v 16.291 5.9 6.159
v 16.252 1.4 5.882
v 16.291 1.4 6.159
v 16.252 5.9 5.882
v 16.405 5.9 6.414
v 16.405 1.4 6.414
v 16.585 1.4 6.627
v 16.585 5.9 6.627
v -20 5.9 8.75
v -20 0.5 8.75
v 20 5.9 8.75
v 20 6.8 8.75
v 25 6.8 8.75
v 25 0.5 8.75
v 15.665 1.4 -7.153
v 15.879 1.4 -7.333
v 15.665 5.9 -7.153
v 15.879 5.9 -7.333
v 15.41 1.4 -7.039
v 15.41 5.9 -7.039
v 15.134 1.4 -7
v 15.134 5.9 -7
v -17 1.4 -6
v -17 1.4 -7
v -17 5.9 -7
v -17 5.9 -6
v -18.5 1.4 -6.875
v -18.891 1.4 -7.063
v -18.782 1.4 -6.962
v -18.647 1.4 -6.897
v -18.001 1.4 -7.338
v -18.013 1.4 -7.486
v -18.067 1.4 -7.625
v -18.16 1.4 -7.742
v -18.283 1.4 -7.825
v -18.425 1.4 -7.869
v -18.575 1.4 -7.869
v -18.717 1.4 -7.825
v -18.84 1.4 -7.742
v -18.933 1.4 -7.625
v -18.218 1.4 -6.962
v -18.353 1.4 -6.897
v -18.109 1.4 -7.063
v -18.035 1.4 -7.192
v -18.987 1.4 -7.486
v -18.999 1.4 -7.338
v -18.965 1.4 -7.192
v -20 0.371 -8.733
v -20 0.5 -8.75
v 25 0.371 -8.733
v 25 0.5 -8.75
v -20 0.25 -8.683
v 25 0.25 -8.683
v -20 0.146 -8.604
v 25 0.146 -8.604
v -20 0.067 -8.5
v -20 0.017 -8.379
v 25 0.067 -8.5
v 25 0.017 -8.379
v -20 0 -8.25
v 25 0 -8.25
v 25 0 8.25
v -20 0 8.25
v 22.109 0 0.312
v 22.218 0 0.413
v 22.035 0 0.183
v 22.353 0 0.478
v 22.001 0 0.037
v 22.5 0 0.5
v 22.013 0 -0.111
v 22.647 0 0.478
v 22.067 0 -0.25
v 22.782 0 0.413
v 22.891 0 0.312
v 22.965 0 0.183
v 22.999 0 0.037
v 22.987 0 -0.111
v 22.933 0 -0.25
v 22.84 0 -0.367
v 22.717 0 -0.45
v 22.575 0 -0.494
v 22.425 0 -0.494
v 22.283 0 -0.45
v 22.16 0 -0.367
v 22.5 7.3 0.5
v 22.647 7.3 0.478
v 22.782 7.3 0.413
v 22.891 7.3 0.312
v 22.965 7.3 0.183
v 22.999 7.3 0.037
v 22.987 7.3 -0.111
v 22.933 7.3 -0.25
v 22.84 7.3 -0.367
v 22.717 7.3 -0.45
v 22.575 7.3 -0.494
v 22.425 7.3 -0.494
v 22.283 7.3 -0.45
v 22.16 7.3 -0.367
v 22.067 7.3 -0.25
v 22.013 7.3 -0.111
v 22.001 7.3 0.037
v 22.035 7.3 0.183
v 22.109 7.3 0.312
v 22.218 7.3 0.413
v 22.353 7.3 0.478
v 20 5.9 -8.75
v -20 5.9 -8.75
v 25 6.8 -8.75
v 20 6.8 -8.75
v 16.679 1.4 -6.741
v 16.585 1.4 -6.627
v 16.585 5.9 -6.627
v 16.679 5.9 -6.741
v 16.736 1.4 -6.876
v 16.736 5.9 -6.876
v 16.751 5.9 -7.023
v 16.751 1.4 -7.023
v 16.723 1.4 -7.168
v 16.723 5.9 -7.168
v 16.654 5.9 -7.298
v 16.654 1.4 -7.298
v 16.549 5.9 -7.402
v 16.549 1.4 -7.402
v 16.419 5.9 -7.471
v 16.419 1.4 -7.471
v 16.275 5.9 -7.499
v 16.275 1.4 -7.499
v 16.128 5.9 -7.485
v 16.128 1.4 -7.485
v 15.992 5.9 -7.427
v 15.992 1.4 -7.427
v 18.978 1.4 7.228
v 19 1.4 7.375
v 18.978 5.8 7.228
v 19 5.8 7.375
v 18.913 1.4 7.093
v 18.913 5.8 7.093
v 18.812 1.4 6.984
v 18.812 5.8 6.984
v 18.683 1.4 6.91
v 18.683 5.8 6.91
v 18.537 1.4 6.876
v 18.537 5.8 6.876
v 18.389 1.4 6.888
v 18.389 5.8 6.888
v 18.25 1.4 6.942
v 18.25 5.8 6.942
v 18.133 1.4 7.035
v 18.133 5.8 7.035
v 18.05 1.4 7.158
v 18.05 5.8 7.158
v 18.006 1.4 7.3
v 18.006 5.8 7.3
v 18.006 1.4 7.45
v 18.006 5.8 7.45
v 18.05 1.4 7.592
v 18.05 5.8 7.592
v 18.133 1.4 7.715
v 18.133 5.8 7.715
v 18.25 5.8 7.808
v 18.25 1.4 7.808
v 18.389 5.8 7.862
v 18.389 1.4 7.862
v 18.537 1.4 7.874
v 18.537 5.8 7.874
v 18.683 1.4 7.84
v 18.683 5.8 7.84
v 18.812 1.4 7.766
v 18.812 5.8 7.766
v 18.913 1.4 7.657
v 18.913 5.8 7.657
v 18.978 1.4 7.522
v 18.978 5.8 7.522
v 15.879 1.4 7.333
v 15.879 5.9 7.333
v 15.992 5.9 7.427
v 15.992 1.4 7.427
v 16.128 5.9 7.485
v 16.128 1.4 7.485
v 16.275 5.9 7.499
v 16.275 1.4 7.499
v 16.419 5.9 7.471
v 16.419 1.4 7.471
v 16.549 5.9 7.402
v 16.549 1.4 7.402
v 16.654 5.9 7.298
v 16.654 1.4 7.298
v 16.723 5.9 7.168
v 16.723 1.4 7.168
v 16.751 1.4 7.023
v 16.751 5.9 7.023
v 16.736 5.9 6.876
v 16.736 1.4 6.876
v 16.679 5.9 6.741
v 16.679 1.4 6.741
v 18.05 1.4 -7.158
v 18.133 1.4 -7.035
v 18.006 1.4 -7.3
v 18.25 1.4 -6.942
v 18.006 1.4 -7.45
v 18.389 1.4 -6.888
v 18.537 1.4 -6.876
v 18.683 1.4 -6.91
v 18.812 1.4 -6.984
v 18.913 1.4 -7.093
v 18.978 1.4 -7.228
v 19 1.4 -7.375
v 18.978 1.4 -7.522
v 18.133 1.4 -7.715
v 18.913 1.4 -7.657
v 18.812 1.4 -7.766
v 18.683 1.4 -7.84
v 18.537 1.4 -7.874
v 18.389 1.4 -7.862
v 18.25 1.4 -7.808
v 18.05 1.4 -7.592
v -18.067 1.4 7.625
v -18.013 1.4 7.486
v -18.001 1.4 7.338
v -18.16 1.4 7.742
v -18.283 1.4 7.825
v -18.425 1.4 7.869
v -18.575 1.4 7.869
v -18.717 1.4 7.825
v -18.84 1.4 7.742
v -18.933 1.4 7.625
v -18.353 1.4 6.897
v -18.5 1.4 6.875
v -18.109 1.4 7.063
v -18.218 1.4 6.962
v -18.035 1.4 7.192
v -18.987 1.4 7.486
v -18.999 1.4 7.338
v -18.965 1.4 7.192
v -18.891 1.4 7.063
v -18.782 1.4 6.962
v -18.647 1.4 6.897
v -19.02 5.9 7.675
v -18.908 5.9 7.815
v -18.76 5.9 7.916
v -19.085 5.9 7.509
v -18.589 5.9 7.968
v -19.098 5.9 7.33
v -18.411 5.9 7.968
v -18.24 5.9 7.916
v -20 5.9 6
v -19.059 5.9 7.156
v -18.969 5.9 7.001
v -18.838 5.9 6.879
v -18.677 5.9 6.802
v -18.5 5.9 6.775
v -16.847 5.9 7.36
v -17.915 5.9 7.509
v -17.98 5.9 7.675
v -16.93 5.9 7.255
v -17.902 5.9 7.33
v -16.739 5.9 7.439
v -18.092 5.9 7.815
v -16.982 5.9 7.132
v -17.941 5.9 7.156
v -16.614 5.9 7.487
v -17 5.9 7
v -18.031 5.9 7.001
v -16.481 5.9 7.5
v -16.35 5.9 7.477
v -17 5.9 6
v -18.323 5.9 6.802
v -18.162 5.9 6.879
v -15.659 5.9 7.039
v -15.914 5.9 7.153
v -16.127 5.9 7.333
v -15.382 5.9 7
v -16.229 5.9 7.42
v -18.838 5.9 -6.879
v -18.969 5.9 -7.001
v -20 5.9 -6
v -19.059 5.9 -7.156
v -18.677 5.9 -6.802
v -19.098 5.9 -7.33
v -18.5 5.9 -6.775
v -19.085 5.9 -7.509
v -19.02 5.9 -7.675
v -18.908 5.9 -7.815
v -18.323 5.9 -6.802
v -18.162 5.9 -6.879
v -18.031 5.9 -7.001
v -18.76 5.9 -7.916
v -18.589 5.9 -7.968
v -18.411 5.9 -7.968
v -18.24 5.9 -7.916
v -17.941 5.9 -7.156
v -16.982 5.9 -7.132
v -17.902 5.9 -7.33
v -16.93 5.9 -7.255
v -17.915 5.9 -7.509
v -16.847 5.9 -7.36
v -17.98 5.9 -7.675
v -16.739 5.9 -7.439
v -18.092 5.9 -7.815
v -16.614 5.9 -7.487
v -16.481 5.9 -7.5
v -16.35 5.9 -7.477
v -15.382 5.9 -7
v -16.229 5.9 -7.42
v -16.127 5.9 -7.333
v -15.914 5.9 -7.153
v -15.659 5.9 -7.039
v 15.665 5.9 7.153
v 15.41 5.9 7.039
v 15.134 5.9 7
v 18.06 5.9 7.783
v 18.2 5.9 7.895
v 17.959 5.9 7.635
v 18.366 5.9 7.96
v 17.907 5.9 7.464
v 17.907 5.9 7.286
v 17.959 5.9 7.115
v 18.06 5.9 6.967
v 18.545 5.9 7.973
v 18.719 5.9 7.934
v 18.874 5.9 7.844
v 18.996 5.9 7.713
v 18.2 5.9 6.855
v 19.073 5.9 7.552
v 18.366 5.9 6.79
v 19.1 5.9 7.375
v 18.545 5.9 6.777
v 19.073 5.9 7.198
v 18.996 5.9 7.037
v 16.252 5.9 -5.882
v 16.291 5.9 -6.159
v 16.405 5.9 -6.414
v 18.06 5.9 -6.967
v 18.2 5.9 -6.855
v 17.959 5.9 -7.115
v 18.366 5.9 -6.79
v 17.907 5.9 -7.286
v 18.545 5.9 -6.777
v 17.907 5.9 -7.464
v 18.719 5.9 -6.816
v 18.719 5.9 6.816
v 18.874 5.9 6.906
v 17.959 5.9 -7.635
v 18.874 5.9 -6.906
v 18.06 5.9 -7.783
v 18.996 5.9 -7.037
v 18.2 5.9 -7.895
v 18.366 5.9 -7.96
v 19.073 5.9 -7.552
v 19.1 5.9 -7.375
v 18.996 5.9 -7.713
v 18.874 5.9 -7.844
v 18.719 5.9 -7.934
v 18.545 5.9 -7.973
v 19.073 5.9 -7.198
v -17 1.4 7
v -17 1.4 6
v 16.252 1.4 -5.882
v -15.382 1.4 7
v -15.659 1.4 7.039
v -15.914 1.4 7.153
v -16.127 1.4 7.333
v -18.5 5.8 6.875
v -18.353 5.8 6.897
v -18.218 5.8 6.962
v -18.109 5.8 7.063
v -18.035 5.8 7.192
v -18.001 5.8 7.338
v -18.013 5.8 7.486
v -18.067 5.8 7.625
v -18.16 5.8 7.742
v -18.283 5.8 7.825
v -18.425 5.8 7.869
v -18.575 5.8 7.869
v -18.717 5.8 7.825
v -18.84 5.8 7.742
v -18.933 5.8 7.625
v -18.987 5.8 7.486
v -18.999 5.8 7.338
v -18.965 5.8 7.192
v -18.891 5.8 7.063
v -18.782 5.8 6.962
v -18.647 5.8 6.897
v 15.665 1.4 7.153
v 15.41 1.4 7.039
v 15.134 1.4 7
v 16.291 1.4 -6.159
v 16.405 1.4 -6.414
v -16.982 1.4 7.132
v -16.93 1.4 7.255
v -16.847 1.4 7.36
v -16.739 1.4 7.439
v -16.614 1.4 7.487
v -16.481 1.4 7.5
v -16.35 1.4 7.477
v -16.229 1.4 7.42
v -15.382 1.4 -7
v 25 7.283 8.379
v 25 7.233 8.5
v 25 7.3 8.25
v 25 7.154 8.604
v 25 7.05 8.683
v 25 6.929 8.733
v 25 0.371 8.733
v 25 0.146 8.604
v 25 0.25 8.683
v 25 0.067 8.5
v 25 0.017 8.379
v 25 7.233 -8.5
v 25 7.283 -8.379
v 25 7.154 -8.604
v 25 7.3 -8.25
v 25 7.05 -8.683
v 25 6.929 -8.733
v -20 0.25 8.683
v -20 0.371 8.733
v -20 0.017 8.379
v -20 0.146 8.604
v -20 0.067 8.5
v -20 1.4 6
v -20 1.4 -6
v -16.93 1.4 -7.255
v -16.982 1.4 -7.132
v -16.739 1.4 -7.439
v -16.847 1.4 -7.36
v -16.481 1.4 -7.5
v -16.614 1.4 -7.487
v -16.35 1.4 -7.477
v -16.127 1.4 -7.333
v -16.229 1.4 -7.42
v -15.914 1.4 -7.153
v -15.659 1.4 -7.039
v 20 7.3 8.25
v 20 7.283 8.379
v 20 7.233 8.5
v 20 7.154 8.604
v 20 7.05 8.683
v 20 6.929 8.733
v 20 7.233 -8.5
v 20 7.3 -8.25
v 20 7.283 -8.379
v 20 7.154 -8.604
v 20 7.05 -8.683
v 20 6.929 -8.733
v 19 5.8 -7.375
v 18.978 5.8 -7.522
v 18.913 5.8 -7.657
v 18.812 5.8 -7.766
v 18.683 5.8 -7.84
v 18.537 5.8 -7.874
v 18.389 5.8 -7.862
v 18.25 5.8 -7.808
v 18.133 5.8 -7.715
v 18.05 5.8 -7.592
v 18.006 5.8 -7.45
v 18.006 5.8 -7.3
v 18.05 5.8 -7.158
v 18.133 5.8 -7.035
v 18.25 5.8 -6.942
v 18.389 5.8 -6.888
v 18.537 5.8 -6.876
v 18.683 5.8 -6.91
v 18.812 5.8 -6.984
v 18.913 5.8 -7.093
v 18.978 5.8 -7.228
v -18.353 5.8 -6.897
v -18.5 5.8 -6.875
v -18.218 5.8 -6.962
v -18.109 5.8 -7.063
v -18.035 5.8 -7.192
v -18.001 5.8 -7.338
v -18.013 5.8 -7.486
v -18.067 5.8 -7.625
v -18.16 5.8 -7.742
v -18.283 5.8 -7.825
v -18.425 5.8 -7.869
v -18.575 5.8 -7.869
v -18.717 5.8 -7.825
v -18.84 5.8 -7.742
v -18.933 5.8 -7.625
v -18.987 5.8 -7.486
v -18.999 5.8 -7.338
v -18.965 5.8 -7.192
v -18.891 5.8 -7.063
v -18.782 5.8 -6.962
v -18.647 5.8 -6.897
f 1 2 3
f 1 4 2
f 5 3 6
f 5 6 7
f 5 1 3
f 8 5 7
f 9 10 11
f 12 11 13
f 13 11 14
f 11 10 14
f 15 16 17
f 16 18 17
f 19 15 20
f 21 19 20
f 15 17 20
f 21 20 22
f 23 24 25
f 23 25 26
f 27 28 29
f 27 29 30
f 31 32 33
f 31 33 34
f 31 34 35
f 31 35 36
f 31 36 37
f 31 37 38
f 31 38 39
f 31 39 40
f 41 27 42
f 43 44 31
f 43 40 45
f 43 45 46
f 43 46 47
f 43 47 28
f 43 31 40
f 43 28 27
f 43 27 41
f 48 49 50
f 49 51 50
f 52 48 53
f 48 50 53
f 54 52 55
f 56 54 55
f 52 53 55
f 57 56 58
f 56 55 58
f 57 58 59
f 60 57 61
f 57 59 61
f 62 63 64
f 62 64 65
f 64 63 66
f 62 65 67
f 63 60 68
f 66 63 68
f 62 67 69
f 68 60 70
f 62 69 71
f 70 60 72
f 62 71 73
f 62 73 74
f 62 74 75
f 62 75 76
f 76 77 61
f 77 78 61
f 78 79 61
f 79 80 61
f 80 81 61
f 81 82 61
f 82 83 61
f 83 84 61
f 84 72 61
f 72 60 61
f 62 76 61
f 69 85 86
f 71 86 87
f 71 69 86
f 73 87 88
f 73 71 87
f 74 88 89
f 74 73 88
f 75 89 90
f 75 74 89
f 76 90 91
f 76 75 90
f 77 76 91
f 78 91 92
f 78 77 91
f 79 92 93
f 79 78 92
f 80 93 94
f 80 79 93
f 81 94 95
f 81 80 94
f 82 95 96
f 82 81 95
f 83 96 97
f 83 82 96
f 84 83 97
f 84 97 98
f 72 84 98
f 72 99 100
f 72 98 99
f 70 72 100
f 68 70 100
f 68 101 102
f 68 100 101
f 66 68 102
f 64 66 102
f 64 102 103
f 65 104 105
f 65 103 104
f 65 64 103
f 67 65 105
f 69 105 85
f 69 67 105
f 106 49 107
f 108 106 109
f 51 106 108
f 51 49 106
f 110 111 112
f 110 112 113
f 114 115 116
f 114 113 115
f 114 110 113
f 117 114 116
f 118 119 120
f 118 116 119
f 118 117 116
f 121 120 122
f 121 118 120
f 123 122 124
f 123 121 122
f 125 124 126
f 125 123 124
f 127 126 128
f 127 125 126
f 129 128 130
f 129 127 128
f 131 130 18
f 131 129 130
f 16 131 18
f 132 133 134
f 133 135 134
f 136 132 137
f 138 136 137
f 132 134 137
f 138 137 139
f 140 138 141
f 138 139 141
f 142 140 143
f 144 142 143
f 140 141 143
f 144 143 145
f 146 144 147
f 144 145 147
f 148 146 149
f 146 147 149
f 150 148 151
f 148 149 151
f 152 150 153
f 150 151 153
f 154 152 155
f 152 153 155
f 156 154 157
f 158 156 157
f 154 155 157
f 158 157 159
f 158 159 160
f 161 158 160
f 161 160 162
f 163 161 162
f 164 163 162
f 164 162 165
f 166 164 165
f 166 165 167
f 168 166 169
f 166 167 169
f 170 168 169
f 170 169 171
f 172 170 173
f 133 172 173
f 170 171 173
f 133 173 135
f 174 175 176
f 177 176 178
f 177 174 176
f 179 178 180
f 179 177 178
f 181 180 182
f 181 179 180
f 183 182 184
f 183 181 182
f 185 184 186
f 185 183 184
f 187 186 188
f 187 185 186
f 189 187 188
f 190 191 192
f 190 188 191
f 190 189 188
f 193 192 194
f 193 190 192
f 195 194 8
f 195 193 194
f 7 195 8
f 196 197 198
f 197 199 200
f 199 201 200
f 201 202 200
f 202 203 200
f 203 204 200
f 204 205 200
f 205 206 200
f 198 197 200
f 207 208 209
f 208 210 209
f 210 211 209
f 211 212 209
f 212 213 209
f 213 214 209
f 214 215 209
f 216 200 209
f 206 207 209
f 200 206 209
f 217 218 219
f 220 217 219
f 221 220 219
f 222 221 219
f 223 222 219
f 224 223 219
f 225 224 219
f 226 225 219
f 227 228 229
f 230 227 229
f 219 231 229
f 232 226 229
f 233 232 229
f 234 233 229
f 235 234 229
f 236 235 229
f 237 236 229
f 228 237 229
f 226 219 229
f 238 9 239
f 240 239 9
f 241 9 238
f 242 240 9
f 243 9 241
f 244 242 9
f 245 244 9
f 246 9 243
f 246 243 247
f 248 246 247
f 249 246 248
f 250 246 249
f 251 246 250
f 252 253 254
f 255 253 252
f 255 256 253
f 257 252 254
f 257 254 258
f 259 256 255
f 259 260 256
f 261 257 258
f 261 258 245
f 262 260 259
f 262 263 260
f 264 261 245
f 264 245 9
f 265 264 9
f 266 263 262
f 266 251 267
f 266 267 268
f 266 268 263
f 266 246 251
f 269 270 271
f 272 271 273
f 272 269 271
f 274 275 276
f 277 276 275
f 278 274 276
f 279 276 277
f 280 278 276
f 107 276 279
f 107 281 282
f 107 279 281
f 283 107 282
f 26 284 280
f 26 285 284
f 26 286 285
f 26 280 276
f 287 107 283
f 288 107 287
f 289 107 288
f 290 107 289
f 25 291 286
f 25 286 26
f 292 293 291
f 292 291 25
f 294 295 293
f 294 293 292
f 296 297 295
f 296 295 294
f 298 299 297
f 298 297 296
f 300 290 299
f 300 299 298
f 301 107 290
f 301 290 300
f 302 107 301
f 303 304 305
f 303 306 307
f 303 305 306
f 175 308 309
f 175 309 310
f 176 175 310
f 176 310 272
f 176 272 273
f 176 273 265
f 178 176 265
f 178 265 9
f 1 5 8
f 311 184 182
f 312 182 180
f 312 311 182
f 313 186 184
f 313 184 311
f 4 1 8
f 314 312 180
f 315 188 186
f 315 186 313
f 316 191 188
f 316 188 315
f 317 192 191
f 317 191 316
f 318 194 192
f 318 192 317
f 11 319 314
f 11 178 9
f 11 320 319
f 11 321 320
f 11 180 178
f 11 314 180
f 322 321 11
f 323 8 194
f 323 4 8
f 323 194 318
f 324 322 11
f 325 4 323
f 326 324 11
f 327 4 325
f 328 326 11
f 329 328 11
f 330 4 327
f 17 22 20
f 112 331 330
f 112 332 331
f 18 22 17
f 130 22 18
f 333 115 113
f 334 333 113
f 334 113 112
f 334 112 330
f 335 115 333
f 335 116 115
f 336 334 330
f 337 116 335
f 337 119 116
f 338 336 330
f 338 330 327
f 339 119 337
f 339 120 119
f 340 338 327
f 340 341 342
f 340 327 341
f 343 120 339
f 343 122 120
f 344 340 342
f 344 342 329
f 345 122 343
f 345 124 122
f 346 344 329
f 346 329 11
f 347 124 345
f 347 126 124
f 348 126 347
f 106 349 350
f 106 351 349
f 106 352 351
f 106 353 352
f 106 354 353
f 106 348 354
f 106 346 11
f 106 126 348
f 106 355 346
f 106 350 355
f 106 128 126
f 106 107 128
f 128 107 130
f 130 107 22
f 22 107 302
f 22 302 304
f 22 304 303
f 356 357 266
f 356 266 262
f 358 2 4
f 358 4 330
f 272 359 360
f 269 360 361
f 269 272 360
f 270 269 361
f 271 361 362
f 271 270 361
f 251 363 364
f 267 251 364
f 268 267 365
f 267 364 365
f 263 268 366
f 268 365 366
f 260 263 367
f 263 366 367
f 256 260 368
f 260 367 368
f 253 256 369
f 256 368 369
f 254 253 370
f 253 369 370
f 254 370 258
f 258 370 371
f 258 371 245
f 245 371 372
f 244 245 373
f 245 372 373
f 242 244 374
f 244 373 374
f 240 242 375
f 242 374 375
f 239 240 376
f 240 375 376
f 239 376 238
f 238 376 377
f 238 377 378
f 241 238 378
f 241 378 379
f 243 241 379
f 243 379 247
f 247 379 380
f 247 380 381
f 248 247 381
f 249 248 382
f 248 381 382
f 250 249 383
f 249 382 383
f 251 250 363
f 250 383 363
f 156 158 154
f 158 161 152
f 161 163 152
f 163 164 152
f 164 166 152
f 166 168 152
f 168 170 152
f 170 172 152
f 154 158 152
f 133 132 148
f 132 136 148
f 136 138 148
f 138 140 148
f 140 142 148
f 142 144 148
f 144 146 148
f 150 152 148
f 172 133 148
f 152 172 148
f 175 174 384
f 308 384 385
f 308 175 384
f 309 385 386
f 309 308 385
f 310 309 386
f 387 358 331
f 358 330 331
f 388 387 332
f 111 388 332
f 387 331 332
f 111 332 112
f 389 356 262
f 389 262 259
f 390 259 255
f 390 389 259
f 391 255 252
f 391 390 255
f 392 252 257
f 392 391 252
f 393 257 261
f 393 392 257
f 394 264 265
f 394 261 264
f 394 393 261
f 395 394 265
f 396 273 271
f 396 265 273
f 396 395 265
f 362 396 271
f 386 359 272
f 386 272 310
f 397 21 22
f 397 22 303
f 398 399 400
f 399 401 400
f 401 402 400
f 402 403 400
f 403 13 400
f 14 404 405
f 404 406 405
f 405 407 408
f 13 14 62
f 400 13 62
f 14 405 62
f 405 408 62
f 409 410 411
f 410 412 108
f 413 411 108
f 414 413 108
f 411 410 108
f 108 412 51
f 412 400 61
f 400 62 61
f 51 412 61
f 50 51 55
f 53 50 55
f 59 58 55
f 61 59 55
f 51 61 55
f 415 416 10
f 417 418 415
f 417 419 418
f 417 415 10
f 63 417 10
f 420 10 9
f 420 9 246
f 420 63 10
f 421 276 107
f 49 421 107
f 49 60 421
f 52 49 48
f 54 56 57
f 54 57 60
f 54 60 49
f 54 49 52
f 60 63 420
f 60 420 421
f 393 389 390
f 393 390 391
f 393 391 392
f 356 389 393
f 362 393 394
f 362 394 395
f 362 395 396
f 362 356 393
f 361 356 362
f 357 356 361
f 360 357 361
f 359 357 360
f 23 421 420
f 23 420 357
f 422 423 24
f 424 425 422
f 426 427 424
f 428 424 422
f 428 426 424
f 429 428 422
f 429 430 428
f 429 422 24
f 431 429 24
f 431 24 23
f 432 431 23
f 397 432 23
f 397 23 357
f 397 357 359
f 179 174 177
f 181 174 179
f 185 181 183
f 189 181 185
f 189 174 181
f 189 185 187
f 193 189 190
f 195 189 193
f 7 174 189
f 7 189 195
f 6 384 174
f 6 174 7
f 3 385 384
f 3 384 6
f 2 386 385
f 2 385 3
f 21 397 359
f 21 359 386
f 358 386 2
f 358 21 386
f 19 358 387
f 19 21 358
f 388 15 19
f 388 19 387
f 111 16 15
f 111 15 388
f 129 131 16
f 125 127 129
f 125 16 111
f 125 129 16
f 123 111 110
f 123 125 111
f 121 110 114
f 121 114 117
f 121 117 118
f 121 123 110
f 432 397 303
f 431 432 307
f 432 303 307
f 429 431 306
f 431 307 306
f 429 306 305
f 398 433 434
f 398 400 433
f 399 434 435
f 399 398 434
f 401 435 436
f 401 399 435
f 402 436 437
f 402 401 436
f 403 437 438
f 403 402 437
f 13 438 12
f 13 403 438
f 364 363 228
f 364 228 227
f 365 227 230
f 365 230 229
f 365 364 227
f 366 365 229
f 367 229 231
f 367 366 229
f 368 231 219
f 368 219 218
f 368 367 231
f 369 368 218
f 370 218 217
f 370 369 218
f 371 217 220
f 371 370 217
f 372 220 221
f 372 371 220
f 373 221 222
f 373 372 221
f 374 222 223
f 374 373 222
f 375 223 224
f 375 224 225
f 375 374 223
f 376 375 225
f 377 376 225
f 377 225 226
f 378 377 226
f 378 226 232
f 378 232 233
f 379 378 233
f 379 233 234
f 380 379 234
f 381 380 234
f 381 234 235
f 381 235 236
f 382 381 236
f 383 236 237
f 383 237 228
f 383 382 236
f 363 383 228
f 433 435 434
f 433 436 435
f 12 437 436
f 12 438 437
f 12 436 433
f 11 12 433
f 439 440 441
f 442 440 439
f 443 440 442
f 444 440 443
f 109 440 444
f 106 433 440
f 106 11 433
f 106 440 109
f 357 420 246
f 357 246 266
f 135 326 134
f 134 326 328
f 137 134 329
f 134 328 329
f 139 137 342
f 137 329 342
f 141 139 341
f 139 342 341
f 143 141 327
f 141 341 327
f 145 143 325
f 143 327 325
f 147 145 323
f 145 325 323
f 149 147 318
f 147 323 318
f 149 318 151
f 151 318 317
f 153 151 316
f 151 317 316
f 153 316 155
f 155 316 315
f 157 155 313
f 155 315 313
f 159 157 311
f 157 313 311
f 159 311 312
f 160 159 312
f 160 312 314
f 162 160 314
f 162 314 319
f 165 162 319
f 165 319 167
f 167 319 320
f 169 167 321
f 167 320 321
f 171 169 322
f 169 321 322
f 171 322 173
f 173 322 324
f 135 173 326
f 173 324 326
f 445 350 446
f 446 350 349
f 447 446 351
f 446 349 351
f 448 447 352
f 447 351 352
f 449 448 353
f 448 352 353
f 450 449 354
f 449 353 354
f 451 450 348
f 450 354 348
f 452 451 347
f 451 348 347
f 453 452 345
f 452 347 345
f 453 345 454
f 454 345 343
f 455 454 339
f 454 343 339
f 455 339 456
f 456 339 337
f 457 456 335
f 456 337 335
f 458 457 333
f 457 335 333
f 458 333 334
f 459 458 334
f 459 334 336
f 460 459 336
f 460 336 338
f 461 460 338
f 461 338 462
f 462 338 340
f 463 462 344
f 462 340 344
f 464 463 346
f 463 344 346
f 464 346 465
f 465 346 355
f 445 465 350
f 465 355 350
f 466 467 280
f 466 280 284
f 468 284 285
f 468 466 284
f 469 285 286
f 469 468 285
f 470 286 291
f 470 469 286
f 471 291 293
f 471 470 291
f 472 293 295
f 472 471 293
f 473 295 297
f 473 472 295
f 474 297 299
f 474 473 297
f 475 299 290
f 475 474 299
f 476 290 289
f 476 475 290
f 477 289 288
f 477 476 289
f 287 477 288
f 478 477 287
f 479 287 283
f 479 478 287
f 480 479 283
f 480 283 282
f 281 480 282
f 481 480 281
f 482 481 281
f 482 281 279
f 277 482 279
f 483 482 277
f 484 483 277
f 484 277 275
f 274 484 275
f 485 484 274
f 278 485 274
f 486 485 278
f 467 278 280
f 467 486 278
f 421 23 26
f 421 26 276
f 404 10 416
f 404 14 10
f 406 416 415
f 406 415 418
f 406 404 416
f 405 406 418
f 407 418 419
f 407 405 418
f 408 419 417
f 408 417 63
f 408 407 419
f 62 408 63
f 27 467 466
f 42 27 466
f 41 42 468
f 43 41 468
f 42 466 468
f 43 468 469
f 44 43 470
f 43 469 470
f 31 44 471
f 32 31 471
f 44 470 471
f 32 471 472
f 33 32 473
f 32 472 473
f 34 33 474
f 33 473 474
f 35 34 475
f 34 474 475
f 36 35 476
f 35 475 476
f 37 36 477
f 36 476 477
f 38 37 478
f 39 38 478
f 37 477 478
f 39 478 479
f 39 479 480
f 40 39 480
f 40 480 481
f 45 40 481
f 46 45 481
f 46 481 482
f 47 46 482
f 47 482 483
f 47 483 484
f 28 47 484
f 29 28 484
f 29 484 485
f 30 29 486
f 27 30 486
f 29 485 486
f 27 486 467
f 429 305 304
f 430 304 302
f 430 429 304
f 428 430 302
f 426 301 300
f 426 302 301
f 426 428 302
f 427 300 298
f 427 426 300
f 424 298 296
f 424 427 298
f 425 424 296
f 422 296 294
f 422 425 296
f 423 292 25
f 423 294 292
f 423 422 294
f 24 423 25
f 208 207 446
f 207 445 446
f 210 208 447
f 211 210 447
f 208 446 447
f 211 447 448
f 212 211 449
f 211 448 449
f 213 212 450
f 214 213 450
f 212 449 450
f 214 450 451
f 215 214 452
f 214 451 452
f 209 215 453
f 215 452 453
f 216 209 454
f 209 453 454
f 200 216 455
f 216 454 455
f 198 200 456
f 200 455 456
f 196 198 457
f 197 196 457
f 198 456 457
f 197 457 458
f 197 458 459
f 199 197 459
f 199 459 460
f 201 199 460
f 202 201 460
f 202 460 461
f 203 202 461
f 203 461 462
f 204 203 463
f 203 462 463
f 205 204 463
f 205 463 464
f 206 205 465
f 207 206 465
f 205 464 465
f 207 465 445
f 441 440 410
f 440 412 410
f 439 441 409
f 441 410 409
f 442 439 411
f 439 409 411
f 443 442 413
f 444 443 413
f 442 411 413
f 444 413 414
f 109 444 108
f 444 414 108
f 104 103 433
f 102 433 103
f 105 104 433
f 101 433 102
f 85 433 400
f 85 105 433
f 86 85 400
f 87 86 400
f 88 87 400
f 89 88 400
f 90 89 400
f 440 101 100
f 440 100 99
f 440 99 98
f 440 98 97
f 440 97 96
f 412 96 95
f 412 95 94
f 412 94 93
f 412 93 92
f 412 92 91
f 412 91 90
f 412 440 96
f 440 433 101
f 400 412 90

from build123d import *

# Parameters (mm, degrees)
SKETCH_1_W                 = 45
SKETCH_1_H                 = 17.5
EXTRUDE_2_DEPTH            = 5.9
CUT_EXTRUDE_1_DEPTH        = 10
CUT_EXTRUDE_1_DEPTH_BACK   = 2.4
FILLET_1_R                 = 1
FILLET_2_R                 = 1
FILLET_5_R                 = 1
FILLET_6_R                 = 1
FILLET_7_R                 = 0.5
SKETCH_5_R                 = 0.5
CUT_EXTRUDE_2_DEPTH        = 4.5
CHAMFER_1_SIZE             = 0.1
CHAMFER_1_OF_MIRROR_1_SIZE = 0.1
SKETCH_20_W                = 5
SKETCH_20_H                = 17.5
EXTRUDE_3_DEPTH            = 1.4
FILLET_8_R                 = 0.5
SKETCH_21_R                = 0.5
CUT_EXTRUDE_3_DEPTH        = 11


# Read off the part's stored shape, not the designer's step: 镜向2
with BuildPart() as part:
    # 草图1 → 凸台-拉伸2 (new body)
    with BuildSketch(Plane(origin=(0, 0, 0), x_dir=(1, 0, 0), z_dir=(0, 1, 0))):
        with Locations((2.5, 0)):
            Rectangle(SKETCH_1_W, SKETCH_1_H)
    extrude(amount=EXTRUDE_2_DEPTH)

    # 草图3 → 切除-拉伸1 (cut, two sides: drawn at the far end of the back side and taken through both)
    with BuildSketch(Plane(origin=(0, 3.8, 0), x_dir=(1, 0, 0), z_dir=(0, 1, 0)).offset(-CUT_EXTRUDE_1_DEPTH_BACK)):
        with BuildLine():
            Line((-17, -6.5), (-17, -7))
            ThreePointArc((-17, -7), (-16.5, -7.5), (-16, -7))
            Line((-16, -7), (15.751729614, -7))
            ThreePointArc((15.751729614, -7), (16.605283005, -7.353553391), (16.251729614, -6.5))
            Line((16.251729614, -6.5), (16.251729614, 6.5))
            ThreePointArc((16.251729614, 6.5), (16.605283005, 7.353553391), (15.751729614, 7))
            Line((15.751729614, 7), (-16, 7))
            ThreePointArc((-16, 7), (-16.5, 7.5), (-17, 7))
            Line((-17, 7), (-17, 6.5))
            Line((-17, 6.5), (-17, 6))
            Line((-17, 6), (-20, 6))
            Line((-20, 6), (-20, -6))
            Line((-20, -6), (-17, -6))
            Line((-17, -6), (-17, -6.5))
        make_face()
    extrude(amount=CUT_EXTRUDE_1_DEPTH + CUT_EXTRUDE_1_DEPTH_BACK, mode=Mode.SUBTRACT)

    # 圆角1
    fillet_1_edges = [part.edges().sort_by_distance(p)[0] for p in [
        (16.251729614, 3.65, -6.5),
    ]]
    fillet(fillet_1_edges, radius=FILLET_1_R)

    # 圆角2
    fillet_2_edges = [part.edges().sort_by_distance(p)[0] for p in [
        (15.751729614, 3.65, -7),
    ]]
    fillet(fillet_2_edges, radius=FILLET_2_R)

    # 圆角5
    fillet_5_edges = [part.edges().sort_by_distance(p)[0] for p in [
        (-16, 3.65, 7),
        (-16, 3.65, -7),
    ]]
    fillet(fillet_5_edges, radius=FILLET_5_R)

    # 圆角6
    fillet_6_edges = [part.edges().sort_by_distance(p)[0] for p in [
        (15.751729614, 3.65, 7),
        (16.251729614, 3.65, 6.5),
    ]]
    fillet(fillet_6_edges, radius=FILLET_6_R)

    # 圆角7
    fillet_7_edges = [part.edges().sort_by_distance(p)[0] for p in [
        (2.5, 0, -8.75),
        (2.5, 0, 8.75),
    ]]
    fillet(fillet_7_edges, radius=FILLET_7_R)

    # 草图5 → 切除-拉伸2 (cut)
    with BuildSketch(Plane(origin=(0, 5.9, 0), x_dir=(1, 0, 0), z_dir=(0, 1, 0))):
        with Locations(Location((-18.5, 7.375, 0), (0, 0, 270))):
            Circle(SKETCH_5_R)
    cut_extrude_2 = extrude(amount=-CUT_EXTRUDE_2_DEPTH, mode=Mode.SUBTRACT)

    # 倒角1
    chamfer_1_edges = [part.edges().sort_by_distance(p)[0] for p in [
        (-18.5, 5.9, -7.875),
    ]]
    chamfer(chamfer_1_edges, length=CHAMFER_1_SIZE)

    # 镜向1: 切除-拉伸2 across plane
    add(cut_extrude_2.mirror(Plane.XY), mode=Mode.SUBTRACT)

    # 倒角1 of 镜向1
    chamfer_1_of_mirror_1_edges = [part.edges().sort_by_distance(p)[0] for p in [
        (-18.5, 5.9, 7.875),
    ]]
    chamfer(chamfer_1_of_mirror_1_edges, length=CHAMFER_1_OF_MIRROR_1_SIZE)

    # 镜向2 outline → 镜向2 (revolve, cut)
    with BuildSketch(Plane(origin=(18.5, 0, -7.375), x_dir=(1, 0, 0), z_dir=(0, 0, 1))):
        Polygon((0, 5.9), (0, 1.4), (0.5, 1.4), (0.5, 5.8), (0.6, 5.9), align=None)
    revolve(axis=Axis((18.5, 0, -7.375), (0, 1, 0)), mode=Mode.SUBTRACT)

    # Mirror 2 2 outline → Mirror 2 2 (revolve, cut)
    with BuildSketch(Plane(origin=(18.5, 0, 7.375), x_dir=(1, 0, 0), z_dir=(0, 0, 1))):
        Polygon((0, 5.9), (0, 1.4), (0.5, 1.4), (0.5, 5.8), (0.6, 5.9), align=None)
    revolve(axis=Axis((18.5, 0, 7.375), (0, 1, 0)), mode=Mode.SUBTRACT)

    # 草图20 → 凸台-拉伸3 (add)
    with BuildSketch(Plane(origin=(0, 5.9, 0), x_dir=(1, 0, 0), z_dir=(0, 1, 0))):
        with Locations((22.5, 0)):
            Rectangle(SKETCH_20_W, SKETCH_20_H)
    extrude(amount=EXTRUDE_3_DEPTH)

    # 圆角8
    fillet_8_edges = [part.edges().sort_by_distance(p)[0] for p in [
        (22.5, 7.3, 8.75),
        (22.5, 7.3, -8.75),
    ]]
    fillet(fillet_8_edges, radius=FILLET_8_R)

    # 草图21 → 切除-拉伸3 (cut)
    with BuildSketch(Plane(origin=(0, 0, 0), x_dir=(1, 0, 0), z_dir=(0, 1, 0))):
        with Locations(Location((22.5, 0, 0), (0, 0, 270))):
            Circle(SKETCH_21_R)
    extrude(amount=CUT_EXTRUDE_3_DEPTH, mode=Mode.SUBTRACT)


solid = part.part
